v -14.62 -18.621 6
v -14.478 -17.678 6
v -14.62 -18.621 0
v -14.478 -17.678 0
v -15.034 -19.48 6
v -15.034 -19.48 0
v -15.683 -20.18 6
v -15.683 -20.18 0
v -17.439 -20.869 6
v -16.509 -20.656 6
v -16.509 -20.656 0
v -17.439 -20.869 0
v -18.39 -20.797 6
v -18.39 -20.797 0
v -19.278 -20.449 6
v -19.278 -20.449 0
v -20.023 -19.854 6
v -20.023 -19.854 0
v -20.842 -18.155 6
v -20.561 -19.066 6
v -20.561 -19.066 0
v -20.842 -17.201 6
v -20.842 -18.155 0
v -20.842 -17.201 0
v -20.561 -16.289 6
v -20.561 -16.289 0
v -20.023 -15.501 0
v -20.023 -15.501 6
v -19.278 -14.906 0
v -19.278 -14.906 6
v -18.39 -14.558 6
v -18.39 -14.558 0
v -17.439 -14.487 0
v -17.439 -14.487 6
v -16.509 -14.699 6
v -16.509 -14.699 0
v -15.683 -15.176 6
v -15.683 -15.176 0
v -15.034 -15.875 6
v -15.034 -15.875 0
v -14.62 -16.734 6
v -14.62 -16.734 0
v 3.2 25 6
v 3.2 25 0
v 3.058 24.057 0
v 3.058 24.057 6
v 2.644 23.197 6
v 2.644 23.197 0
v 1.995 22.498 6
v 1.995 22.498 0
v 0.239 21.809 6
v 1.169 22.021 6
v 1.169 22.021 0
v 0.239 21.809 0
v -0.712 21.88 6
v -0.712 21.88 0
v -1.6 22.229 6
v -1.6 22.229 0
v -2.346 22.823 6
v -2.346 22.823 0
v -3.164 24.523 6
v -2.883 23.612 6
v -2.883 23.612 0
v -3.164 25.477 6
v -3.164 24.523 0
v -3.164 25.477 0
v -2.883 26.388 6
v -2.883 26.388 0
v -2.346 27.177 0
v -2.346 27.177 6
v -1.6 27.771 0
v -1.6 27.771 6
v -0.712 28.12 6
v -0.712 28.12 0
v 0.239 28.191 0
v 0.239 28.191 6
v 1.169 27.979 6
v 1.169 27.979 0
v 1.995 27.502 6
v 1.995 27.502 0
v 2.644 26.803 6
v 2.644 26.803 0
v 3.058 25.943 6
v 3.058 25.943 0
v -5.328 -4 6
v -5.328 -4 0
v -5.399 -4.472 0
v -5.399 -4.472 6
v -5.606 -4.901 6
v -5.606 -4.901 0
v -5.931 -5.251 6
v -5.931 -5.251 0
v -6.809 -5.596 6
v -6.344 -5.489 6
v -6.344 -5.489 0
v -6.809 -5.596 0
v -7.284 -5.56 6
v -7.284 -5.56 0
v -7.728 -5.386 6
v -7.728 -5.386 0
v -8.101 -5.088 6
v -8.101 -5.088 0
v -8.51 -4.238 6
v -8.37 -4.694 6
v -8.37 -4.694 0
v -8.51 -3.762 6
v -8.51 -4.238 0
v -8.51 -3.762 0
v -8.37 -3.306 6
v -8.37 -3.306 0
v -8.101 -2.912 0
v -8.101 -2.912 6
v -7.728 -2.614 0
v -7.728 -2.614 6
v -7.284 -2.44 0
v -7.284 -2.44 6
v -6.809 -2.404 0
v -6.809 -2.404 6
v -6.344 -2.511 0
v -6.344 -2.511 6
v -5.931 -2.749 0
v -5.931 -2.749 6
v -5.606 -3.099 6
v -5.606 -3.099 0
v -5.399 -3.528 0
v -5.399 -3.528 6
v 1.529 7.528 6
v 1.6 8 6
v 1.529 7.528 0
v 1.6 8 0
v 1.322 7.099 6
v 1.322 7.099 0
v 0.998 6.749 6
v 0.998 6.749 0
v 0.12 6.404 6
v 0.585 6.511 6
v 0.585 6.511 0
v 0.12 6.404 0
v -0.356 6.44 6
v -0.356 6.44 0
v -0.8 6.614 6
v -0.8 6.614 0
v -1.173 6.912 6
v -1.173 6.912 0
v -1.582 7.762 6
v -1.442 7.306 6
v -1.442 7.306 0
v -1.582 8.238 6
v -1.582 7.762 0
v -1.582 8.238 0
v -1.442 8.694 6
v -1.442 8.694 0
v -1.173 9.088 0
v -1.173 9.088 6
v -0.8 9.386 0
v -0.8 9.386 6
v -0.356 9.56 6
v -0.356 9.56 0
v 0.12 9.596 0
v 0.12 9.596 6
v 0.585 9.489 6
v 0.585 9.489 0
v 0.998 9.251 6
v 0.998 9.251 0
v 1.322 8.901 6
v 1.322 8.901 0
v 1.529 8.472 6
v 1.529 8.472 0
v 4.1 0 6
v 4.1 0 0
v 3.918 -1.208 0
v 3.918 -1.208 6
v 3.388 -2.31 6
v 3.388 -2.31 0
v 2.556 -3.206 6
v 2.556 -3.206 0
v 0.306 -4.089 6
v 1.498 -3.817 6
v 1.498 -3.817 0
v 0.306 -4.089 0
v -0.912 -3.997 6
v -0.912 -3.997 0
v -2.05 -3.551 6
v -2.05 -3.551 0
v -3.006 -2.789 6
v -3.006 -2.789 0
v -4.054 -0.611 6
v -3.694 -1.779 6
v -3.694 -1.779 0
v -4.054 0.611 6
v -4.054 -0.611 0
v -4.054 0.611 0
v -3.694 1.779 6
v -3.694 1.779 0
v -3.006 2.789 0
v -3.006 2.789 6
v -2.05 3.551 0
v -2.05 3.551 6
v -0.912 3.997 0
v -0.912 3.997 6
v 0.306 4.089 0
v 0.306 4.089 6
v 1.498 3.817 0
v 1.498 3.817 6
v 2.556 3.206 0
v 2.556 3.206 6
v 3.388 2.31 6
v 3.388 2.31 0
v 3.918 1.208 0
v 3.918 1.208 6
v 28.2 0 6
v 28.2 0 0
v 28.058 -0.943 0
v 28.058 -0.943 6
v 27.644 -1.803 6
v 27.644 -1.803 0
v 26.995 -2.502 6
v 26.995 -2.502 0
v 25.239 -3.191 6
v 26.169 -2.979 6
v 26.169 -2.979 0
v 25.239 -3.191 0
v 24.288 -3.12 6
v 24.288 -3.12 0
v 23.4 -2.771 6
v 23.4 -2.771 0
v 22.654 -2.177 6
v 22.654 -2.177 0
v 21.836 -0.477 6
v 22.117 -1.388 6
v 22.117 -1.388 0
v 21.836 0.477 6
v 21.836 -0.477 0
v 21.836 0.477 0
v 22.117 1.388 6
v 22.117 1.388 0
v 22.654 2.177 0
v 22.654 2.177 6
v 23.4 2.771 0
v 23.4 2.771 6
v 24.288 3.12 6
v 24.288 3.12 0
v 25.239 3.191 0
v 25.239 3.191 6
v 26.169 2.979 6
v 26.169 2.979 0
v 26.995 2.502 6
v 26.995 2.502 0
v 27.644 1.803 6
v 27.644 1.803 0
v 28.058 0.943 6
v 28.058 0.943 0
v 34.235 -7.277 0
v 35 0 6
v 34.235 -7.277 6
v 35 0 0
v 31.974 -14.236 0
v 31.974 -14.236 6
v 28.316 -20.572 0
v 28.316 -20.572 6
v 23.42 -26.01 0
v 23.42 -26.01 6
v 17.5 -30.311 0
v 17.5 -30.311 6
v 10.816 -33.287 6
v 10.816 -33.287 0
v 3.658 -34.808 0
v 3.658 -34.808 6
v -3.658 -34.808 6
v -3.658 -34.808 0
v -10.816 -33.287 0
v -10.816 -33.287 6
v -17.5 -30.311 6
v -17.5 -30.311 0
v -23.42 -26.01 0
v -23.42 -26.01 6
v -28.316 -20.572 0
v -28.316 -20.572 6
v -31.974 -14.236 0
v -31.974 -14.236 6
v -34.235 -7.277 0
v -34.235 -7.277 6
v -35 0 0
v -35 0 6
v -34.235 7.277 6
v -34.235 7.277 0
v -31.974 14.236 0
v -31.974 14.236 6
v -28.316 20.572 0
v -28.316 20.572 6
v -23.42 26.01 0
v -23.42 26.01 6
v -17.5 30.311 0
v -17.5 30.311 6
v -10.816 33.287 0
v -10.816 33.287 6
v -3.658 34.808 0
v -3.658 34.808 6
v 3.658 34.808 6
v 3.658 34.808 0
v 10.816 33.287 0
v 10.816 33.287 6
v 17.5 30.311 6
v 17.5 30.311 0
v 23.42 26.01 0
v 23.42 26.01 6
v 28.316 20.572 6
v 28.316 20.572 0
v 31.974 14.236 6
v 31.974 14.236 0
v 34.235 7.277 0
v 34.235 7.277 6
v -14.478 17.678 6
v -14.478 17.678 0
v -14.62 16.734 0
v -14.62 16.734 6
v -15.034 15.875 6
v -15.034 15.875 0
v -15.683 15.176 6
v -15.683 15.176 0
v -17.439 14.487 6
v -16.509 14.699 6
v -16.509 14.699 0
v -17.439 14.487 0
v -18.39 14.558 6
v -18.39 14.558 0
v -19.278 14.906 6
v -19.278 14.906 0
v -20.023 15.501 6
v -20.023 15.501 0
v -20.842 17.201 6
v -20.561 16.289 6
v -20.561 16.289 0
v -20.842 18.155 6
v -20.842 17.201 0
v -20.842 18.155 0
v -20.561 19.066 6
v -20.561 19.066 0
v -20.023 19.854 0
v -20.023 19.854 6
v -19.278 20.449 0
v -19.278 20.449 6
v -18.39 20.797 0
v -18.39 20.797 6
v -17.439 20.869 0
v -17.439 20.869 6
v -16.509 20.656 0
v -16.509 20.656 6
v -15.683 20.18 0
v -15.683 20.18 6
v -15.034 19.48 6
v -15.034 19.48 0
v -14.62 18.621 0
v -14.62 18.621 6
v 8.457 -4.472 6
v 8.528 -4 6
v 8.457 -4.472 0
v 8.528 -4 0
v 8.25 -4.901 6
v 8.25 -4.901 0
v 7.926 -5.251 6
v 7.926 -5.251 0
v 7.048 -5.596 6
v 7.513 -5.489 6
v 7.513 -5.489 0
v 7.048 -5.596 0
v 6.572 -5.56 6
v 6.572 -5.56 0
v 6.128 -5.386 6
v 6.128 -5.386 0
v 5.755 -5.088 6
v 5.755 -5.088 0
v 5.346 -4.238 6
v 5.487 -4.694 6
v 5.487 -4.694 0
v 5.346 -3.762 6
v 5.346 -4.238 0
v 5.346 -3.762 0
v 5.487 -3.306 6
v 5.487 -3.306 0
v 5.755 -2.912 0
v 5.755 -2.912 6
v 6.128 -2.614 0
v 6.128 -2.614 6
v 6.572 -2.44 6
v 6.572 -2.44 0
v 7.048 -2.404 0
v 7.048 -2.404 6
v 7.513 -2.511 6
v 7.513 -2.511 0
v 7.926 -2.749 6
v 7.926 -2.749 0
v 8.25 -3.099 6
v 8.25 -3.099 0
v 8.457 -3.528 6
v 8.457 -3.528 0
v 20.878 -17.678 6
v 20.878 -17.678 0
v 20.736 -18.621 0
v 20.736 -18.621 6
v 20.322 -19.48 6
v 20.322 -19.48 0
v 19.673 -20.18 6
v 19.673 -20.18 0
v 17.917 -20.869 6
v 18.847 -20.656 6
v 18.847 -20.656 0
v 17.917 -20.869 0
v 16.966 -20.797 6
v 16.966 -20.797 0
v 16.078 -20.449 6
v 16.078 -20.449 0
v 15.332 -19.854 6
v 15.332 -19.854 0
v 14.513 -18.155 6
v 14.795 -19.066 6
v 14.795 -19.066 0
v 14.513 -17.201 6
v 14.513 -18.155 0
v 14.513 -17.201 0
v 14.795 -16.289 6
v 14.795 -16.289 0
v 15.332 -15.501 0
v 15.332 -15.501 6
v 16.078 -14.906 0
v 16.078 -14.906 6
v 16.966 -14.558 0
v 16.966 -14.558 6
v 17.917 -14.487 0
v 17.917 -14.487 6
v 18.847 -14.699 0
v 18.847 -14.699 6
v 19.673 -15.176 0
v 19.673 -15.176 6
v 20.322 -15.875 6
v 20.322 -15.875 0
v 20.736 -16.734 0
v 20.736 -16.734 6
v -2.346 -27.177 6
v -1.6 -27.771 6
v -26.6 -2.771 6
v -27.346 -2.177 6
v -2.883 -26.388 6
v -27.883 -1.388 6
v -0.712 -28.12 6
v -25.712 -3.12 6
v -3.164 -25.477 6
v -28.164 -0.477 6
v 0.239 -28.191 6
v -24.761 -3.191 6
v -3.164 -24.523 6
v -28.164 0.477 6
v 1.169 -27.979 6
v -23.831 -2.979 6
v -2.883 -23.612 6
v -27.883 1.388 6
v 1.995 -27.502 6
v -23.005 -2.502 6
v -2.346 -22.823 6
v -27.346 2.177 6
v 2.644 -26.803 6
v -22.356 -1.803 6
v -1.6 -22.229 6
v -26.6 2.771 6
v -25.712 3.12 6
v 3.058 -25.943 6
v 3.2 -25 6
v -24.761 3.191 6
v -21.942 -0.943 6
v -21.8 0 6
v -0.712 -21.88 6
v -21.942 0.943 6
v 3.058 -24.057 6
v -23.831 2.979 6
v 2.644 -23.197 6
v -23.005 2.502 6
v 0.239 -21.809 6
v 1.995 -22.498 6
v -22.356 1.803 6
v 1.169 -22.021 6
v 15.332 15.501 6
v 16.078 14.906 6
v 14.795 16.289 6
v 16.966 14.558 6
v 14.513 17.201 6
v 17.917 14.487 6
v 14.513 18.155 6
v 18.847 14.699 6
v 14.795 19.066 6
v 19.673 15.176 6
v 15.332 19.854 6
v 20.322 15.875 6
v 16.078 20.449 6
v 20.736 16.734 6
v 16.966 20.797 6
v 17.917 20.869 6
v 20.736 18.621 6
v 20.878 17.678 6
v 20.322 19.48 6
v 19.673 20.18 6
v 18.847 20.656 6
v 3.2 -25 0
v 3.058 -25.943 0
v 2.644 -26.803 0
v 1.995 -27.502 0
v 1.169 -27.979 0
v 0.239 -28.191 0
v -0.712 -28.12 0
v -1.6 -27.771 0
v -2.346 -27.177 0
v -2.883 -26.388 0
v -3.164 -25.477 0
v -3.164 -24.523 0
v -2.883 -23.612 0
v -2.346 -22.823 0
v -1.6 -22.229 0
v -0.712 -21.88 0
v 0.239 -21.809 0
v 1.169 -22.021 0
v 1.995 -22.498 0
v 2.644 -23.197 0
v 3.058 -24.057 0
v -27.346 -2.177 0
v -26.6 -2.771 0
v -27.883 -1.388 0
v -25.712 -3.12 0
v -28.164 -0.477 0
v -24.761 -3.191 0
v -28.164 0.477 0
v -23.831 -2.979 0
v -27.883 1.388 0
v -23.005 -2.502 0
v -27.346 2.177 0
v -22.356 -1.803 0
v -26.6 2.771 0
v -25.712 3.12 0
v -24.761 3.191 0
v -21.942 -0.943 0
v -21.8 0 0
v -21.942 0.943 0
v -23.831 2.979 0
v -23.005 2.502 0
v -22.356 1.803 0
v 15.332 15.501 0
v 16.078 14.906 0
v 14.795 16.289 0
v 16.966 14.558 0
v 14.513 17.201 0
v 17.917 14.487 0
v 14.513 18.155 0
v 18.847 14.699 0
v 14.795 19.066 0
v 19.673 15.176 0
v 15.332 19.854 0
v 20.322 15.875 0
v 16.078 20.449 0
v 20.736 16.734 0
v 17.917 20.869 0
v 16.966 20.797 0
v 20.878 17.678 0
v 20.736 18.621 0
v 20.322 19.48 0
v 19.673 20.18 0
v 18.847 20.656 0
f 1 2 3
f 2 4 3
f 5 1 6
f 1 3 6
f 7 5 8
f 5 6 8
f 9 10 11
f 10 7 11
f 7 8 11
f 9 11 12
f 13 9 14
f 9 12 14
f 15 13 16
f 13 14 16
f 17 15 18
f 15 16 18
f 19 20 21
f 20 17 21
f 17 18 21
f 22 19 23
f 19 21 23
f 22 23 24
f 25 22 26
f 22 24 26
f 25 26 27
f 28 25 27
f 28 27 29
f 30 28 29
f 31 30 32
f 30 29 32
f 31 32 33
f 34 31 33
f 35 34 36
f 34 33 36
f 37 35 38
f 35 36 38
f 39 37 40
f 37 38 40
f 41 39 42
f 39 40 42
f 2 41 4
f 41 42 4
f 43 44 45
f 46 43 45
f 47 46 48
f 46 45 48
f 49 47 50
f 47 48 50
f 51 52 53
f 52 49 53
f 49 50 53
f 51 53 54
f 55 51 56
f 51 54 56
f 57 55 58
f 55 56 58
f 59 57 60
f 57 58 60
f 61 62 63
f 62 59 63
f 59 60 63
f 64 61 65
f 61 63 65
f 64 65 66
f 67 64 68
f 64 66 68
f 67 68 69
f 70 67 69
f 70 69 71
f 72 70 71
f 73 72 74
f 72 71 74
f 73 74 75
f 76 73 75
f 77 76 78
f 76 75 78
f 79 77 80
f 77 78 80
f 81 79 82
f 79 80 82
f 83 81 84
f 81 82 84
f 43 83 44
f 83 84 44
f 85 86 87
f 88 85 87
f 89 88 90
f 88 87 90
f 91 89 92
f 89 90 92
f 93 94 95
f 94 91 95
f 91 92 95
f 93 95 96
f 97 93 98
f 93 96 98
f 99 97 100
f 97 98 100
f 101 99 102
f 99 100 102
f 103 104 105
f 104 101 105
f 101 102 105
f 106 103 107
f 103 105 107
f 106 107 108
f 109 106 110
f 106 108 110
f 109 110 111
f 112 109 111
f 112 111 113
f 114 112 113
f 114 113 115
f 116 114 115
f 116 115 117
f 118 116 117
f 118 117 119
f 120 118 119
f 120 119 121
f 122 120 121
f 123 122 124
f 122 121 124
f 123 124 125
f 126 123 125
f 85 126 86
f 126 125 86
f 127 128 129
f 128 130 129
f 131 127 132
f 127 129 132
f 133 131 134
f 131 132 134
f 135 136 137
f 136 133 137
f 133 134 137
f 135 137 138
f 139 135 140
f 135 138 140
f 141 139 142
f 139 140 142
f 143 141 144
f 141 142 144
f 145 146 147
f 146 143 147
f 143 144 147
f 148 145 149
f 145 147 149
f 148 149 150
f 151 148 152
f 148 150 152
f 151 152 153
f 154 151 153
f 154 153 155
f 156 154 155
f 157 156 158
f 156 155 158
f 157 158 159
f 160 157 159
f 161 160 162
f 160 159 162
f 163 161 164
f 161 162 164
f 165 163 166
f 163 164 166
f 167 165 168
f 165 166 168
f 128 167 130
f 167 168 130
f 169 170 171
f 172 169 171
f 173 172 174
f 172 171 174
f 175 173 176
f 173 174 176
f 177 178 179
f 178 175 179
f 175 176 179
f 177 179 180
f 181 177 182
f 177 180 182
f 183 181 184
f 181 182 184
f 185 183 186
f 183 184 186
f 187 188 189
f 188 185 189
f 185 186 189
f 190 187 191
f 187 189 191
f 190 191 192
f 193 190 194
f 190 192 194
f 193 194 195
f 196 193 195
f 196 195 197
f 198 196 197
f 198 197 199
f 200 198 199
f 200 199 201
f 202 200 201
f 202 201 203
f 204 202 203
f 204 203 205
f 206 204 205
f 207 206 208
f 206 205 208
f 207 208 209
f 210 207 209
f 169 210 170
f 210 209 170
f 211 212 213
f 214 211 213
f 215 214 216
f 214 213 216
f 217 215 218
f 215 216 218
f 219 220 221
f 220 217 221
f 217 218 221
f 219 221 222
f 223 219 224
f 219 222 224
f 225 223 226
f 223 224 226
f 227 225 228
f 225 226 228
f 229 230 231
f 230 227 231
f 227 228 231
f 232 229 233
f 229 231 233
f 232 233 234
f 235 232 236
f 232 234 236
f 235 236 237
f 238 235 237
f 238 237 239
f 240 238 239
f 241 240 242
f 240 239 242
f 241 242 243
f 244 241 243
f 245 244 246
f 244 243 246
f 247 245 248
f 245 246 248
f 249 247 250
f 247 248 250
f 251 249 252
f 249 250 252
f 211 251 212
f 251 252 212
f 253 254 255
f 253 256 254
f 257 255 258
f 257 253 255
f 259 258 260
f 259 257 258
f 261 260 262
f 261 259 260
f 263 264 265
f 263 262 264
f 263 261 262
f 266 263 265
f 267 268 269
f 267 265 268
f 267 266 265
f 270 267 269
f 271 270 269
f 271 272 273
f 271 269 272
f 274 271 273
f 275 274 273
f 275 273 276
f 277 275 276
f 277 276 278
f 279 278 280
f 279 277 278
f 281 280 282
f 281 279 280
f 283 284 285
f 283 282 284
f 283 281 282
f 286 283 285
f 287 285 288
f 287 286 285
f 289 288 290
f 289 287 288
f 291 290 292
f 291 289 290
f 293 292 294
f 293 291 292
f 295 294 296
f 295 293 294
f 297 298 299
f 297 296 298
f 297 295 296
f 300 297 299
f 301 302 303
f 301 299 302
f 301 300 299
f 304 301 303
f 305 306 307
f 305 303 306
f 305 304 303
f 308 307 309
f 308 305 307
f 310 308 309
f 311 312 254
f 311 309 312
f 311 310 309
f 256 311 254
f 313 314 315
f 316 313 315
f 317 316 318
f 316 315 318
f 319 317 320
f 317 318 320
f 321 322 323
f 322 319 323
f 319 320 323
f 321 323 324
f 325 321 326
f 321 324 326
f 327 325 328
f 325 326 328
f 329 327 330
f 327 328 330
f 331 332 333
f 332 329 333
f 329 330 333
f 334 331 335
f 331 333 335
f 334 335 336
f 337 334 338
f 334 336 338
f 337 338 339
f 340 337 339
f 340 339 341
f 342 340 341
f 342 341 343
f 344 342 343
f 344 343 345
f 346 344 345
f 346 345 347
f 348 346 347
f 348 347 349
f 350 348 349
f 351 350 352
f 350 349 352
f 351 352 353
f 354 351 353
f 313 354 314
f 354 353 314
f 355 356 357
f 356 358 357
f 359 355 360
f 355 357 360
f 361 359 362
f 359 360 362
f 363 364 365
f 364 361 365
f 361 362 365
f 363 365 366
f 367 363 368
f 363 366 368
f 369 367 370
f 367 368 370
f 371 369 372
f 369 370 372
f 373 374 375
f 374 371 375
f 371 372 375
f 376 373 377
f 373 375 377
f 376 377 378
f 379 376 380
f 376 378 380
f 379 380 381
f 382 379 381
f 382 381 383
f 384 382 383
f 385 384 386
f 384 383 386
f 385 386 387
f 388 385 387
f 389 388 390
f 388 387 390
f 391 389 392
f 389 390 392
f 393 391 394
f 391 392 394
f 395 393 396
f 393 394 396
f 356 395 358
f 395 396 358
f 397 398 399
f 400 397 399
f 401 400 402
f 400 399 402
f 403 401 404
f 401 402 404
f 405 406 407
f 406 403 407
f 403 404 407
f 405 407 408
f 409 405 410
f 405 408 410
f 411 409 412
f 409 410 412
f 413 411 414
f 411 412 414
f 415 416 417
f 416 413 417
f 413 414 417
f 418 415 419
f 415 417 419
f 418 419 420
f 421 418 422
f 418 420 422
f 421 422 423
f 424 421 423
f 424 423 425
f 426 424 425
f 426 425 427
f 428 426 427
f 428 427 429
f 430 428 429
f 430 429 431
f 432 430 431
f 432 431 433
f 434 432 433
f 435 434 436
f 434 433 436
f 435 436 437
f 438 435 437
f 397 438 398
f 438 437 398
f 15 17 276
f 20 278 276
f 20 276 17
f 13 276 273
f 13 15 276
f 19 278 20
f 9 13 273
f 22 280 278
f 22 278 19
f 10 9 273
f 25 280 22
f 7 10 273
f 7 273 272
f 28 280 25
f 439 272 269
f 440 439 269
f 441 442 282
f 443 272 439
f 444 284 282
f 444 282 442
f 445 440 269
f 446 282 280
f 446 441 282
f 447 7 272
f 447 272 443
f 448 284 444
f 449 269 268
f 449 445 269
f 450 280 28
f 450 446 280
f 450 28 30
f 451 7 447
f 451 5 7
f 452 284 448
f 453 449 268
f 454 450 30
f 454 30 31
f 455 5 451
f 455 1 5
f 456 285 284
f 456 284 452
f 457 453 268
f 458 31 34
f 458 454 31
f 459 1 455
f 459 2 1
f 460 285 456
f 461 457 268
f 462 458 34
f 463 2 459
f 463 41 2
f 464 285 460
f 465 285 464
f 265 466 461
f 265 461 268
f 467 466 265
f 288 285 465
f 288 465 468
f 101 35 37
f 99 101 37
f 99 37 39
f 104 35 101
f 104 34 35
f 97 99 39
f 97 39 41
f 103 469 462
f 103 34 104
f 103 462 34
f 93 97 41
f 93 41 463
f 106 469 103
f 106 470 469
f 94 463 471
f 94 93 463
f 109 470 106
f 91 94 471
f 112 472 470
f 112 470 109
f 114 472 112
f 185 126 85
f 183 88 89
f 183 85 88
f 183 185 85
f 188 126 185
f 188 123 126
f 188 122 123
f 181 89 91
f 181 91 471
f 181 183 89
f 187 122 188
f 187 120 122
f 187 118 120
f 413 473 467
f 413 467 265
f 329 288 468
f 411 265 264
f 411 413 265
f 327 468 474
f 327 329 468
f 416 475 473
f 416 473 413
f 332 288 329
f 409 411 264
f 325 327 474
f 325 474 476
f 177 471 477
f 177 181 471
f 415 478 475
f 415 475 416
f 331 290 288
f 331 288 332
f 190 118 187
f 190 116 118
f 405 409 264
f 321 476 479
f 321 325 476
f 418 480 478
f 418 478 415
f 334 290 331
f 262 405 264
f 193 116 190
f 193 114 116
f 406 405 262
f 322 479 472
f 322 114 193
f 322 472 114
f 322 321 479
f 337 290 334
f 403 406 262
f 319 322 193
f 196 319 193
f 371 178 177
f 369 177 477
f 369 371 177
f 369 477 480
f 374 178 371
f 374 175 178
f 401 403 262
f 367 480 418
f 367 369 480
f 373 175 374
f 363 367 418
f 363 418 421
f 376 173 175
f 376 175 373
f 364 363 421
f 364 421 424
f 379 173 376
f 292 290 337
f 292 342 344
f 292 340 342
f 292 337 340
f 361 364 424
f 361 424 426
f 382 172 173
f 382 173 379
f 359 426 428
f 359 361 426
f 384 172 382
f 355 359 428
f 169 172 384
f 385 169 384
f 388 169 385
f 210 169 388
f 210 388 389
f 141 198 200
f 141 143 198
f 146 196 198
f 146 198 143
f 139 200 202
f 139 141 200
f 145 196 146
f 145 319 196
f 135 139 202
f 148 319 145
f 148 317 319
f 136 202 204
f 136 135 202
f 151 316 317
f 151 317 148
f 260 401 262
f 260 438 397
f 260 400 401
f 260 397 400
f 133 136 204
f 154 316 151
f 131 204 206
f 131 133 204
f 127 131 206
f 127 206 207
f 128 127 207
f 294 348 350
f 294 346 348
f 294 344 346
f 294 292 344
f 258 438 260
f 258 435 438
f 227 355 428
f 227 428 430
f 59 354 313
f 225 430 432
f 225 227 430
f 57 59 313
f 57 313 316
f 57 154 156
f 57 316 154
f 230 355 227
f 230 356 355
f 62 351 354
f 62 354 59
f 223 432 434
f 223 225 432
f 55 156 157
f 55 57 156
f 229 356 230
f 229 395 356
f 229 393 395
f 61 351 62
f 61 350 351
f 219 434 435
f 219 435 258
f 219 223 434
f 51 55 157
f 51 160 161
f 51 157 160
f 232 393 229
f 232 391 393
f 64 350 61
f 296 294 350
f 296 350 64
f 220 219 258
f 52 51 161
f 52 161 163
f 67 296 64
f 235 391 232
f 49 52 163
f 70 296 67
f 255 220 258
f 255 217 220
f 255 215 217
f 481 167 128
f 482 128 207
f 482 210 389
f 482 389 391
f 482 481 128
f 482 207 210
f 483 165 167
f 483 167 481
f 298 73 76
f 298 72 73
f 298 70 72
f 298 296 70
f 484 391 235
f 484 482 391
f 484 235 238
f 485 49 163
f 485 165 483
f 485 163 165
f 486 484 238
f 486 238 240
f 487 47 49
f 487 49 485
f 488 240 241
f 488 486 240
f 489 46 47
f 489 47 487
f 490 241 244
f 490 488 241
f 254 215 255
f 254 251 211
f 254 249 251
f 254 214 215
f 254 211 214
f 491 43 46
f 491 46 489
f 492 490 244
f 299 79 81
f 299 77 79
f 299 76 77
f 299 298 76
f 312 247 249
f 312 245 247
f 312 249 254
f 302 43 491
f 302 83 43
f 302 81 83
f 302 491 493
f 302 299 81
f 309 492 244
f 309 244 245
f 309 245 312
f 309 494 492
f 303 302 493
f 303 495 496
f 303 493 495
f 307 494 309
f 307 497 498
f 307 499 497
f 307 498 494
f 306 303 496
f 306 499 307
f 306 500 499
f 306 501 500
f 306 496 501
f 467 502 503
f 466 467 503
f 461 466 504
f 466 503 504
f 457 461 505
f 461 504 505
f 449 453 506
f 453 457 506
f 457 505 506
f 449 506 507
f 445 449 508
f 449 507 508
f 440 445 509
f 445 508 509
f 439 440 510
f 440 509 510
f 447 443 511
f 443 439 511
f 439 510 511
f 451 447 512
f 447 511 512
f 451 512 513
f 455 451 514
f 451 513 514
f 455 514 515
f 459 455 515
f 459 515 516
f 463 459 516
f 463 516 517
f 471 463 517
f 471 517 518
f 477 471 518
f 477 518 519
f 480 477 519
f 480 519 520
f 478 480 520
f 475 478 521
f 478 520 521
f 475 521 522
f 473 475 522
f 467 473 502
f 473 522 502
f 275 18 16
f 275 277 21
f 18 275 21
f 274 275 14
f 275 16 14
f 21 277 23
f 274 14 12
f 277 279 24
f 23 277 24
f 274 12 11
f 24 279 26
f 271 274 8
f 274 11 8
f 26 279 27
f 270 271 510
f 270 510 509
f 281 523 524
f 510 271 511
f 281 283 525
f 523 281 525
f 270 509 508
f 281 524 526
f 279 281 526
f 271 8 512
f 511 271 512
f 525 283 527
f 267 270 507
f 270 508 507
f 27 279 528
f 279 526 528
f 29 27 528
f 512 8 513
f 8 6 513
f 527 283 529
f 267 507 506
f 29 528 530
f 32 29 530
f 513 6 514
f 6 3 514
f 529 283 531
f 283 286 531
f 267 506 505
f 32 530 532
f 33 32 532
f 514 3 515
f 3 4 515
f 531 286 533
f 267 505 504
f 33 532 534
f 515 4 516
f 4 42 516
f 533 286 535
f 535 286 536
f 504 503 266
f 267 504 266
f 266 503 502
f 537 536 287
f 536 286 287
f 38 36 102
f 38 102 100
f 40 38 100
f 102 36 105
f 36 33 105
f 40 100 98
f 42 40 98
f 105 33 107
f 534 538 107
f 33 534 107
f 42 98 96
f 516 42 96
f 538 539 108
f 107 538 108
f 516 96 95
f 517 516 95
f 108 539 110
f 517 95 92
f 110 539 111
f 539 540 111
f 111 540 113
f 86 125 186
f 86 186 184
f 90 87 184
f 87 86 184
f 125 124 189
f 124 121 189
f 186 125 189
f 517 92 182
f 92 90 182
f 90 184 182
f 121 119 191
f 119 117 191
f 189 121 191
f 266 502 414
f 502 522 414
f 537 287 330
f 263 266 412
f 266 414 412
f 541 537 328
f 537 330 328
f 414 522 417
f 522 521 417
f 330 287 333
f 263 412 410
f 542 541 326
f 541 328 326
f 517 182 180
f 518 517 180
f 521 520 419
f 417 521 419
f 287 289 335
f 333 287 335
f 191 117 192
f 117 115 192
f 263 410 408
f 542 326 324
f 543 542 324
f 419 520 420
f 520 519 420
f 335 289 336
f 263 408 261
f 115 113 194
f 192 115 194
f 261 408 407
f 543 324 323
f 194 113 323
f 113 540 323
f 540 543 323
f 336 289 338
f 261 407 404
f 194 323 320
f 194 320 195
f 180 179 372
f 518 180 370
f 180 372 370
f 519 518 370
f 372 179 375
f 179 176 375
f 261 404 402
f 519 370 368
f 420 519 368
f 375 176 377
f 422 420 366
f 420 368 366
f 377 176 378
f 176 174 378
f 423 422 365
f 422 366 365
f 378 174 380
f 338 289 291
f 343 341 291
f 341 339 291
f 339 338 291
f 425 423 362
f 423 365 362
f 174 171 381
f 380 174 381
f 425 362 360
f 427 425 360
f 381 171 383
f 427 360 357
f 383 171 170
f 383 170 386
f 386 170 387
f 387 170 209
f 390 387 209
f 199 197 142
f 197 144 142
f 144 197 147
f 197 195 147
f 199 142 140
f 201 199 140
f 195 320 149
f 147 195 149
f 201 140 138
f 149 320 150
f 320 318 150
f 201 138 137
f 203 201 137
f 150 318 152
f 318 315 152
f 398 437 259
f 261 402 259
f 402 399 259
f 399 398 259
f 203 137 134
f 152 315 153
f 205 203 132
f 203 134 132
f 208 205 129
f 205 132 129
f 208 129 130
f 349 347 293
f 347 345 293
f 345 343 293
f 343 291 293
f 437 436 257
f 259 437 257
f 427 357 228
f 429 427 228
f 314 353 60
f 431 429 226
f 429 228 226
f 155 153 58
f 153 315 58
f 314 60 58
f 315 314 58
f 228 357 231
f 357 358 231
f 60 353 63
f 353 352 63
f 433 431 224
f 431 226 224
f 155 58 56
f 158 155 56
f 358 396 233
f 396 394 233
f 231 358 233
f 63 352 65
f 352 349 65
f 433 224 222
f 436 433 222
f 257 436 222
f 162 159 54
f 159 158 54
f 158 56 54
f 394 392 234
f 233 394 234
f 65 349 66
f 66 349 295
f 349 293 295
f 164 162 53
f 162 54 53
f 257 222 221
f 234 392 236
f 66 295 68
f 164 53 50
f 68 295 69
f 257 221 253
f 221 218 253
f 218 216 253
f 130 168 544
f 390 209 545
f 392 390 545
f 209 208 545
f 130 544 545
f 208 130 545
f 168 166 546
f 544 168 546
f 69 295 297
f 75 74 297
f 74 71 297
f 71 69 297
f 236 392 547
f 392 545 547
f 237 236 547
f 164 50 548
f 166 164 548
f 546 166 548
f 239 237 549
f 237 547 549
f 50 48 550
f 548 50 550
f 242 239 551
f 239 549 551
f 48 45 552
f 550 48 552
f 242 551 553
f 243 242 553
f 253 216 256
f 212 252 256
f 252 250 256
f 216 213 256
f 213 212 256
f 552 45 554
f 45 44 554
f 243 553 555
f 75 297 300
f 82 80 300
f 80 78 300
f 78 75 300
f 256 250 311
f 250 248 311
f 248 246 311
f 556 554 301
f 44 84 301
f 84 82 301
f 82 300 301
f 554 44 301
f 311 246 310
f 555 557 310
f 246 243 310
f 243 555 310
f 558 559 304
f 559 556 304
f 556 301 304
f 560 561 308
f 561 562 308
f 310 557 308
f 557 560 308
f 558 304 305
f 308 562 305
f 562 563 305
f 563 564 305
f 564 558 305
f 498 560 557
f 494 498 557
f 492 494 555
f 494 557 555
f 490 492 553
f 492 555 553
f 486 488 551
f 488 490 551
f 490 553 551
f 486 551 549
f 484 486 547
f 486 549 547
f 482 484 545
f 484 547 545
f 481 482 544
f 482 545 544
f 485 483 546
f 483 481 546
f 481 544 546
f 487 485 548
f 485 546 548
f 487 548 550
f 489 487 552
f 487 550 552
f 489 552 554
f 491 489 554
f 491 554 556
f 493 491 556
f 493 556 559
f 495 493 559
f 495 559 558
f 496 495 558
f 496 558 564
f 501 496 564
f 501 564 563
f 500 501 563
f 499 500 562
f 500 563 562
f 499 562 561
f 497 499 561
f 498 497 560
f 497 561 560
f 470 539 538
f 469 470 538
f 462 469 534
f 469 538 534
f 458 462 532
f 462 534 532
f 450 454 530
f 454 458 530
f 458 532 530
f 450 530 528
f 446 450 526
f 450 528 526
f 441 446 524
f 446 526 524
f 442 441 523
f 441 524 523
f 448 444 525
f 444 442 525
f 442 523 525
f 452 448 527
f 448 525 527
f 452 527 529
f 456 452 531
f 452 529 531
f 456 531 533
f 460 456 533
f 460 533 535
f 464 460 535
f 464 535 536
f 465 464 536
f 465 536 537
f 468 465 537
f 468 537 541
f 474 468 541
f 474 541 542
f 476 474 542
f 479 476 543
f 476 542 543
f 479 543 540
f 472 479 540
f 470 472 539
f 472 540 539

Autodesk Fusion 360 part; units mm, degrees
sketch "Sketch1" plane through (0, 0, 0) normal (0, 0, 1) x (1, 0, 0)
  circle A0 centre (0, 0) radius 4.1
  circle A1 centre (0, 0) radius 35
  circle A2 centre (0, 0) radius 8 construction
  circle A3 centre (0, 0) radius 25 construction
  circle A4 centre (0, 25) radius 6.3
  circle A5 centre (0, 25) radius 3.2
  circle A6 centre (0, 8) radius 1.6
  circle A7 centre (-6.9282, -4) radius 1.6
  circle A8 centre (6.9282, -4) radius 1.6
  circle A9 centre (-17.6777, 17.6777) radius 3.2
  circle A10 centre (-25, 0) radius 3.2
  circle A11 centre (-17.6777, -17.6777) radius 3.2
  circle A12 centre (0, -25) radius 3.2
  circle A13 centre (17.6777, -17.6777) radius 3.2
  circle A14 centre (25, 0) radius 3.2
  circle A15 centre (17.6777, 17.6777) radius 3.2
  dimension "d1" = 8.2
  dimension "d2" = 50
  dimension "d3" = 70
  dimension "d4" = 16
  dimension "d5" = 12.6
  dimension "d6" = 6.4
  dimension "d7" = 3.2
  dimension "d9" = 360
  dimension "d11" = 360
extrude "Extrude1" add sketch "Sketch1" along normal blind 6 contours A1 | A4
